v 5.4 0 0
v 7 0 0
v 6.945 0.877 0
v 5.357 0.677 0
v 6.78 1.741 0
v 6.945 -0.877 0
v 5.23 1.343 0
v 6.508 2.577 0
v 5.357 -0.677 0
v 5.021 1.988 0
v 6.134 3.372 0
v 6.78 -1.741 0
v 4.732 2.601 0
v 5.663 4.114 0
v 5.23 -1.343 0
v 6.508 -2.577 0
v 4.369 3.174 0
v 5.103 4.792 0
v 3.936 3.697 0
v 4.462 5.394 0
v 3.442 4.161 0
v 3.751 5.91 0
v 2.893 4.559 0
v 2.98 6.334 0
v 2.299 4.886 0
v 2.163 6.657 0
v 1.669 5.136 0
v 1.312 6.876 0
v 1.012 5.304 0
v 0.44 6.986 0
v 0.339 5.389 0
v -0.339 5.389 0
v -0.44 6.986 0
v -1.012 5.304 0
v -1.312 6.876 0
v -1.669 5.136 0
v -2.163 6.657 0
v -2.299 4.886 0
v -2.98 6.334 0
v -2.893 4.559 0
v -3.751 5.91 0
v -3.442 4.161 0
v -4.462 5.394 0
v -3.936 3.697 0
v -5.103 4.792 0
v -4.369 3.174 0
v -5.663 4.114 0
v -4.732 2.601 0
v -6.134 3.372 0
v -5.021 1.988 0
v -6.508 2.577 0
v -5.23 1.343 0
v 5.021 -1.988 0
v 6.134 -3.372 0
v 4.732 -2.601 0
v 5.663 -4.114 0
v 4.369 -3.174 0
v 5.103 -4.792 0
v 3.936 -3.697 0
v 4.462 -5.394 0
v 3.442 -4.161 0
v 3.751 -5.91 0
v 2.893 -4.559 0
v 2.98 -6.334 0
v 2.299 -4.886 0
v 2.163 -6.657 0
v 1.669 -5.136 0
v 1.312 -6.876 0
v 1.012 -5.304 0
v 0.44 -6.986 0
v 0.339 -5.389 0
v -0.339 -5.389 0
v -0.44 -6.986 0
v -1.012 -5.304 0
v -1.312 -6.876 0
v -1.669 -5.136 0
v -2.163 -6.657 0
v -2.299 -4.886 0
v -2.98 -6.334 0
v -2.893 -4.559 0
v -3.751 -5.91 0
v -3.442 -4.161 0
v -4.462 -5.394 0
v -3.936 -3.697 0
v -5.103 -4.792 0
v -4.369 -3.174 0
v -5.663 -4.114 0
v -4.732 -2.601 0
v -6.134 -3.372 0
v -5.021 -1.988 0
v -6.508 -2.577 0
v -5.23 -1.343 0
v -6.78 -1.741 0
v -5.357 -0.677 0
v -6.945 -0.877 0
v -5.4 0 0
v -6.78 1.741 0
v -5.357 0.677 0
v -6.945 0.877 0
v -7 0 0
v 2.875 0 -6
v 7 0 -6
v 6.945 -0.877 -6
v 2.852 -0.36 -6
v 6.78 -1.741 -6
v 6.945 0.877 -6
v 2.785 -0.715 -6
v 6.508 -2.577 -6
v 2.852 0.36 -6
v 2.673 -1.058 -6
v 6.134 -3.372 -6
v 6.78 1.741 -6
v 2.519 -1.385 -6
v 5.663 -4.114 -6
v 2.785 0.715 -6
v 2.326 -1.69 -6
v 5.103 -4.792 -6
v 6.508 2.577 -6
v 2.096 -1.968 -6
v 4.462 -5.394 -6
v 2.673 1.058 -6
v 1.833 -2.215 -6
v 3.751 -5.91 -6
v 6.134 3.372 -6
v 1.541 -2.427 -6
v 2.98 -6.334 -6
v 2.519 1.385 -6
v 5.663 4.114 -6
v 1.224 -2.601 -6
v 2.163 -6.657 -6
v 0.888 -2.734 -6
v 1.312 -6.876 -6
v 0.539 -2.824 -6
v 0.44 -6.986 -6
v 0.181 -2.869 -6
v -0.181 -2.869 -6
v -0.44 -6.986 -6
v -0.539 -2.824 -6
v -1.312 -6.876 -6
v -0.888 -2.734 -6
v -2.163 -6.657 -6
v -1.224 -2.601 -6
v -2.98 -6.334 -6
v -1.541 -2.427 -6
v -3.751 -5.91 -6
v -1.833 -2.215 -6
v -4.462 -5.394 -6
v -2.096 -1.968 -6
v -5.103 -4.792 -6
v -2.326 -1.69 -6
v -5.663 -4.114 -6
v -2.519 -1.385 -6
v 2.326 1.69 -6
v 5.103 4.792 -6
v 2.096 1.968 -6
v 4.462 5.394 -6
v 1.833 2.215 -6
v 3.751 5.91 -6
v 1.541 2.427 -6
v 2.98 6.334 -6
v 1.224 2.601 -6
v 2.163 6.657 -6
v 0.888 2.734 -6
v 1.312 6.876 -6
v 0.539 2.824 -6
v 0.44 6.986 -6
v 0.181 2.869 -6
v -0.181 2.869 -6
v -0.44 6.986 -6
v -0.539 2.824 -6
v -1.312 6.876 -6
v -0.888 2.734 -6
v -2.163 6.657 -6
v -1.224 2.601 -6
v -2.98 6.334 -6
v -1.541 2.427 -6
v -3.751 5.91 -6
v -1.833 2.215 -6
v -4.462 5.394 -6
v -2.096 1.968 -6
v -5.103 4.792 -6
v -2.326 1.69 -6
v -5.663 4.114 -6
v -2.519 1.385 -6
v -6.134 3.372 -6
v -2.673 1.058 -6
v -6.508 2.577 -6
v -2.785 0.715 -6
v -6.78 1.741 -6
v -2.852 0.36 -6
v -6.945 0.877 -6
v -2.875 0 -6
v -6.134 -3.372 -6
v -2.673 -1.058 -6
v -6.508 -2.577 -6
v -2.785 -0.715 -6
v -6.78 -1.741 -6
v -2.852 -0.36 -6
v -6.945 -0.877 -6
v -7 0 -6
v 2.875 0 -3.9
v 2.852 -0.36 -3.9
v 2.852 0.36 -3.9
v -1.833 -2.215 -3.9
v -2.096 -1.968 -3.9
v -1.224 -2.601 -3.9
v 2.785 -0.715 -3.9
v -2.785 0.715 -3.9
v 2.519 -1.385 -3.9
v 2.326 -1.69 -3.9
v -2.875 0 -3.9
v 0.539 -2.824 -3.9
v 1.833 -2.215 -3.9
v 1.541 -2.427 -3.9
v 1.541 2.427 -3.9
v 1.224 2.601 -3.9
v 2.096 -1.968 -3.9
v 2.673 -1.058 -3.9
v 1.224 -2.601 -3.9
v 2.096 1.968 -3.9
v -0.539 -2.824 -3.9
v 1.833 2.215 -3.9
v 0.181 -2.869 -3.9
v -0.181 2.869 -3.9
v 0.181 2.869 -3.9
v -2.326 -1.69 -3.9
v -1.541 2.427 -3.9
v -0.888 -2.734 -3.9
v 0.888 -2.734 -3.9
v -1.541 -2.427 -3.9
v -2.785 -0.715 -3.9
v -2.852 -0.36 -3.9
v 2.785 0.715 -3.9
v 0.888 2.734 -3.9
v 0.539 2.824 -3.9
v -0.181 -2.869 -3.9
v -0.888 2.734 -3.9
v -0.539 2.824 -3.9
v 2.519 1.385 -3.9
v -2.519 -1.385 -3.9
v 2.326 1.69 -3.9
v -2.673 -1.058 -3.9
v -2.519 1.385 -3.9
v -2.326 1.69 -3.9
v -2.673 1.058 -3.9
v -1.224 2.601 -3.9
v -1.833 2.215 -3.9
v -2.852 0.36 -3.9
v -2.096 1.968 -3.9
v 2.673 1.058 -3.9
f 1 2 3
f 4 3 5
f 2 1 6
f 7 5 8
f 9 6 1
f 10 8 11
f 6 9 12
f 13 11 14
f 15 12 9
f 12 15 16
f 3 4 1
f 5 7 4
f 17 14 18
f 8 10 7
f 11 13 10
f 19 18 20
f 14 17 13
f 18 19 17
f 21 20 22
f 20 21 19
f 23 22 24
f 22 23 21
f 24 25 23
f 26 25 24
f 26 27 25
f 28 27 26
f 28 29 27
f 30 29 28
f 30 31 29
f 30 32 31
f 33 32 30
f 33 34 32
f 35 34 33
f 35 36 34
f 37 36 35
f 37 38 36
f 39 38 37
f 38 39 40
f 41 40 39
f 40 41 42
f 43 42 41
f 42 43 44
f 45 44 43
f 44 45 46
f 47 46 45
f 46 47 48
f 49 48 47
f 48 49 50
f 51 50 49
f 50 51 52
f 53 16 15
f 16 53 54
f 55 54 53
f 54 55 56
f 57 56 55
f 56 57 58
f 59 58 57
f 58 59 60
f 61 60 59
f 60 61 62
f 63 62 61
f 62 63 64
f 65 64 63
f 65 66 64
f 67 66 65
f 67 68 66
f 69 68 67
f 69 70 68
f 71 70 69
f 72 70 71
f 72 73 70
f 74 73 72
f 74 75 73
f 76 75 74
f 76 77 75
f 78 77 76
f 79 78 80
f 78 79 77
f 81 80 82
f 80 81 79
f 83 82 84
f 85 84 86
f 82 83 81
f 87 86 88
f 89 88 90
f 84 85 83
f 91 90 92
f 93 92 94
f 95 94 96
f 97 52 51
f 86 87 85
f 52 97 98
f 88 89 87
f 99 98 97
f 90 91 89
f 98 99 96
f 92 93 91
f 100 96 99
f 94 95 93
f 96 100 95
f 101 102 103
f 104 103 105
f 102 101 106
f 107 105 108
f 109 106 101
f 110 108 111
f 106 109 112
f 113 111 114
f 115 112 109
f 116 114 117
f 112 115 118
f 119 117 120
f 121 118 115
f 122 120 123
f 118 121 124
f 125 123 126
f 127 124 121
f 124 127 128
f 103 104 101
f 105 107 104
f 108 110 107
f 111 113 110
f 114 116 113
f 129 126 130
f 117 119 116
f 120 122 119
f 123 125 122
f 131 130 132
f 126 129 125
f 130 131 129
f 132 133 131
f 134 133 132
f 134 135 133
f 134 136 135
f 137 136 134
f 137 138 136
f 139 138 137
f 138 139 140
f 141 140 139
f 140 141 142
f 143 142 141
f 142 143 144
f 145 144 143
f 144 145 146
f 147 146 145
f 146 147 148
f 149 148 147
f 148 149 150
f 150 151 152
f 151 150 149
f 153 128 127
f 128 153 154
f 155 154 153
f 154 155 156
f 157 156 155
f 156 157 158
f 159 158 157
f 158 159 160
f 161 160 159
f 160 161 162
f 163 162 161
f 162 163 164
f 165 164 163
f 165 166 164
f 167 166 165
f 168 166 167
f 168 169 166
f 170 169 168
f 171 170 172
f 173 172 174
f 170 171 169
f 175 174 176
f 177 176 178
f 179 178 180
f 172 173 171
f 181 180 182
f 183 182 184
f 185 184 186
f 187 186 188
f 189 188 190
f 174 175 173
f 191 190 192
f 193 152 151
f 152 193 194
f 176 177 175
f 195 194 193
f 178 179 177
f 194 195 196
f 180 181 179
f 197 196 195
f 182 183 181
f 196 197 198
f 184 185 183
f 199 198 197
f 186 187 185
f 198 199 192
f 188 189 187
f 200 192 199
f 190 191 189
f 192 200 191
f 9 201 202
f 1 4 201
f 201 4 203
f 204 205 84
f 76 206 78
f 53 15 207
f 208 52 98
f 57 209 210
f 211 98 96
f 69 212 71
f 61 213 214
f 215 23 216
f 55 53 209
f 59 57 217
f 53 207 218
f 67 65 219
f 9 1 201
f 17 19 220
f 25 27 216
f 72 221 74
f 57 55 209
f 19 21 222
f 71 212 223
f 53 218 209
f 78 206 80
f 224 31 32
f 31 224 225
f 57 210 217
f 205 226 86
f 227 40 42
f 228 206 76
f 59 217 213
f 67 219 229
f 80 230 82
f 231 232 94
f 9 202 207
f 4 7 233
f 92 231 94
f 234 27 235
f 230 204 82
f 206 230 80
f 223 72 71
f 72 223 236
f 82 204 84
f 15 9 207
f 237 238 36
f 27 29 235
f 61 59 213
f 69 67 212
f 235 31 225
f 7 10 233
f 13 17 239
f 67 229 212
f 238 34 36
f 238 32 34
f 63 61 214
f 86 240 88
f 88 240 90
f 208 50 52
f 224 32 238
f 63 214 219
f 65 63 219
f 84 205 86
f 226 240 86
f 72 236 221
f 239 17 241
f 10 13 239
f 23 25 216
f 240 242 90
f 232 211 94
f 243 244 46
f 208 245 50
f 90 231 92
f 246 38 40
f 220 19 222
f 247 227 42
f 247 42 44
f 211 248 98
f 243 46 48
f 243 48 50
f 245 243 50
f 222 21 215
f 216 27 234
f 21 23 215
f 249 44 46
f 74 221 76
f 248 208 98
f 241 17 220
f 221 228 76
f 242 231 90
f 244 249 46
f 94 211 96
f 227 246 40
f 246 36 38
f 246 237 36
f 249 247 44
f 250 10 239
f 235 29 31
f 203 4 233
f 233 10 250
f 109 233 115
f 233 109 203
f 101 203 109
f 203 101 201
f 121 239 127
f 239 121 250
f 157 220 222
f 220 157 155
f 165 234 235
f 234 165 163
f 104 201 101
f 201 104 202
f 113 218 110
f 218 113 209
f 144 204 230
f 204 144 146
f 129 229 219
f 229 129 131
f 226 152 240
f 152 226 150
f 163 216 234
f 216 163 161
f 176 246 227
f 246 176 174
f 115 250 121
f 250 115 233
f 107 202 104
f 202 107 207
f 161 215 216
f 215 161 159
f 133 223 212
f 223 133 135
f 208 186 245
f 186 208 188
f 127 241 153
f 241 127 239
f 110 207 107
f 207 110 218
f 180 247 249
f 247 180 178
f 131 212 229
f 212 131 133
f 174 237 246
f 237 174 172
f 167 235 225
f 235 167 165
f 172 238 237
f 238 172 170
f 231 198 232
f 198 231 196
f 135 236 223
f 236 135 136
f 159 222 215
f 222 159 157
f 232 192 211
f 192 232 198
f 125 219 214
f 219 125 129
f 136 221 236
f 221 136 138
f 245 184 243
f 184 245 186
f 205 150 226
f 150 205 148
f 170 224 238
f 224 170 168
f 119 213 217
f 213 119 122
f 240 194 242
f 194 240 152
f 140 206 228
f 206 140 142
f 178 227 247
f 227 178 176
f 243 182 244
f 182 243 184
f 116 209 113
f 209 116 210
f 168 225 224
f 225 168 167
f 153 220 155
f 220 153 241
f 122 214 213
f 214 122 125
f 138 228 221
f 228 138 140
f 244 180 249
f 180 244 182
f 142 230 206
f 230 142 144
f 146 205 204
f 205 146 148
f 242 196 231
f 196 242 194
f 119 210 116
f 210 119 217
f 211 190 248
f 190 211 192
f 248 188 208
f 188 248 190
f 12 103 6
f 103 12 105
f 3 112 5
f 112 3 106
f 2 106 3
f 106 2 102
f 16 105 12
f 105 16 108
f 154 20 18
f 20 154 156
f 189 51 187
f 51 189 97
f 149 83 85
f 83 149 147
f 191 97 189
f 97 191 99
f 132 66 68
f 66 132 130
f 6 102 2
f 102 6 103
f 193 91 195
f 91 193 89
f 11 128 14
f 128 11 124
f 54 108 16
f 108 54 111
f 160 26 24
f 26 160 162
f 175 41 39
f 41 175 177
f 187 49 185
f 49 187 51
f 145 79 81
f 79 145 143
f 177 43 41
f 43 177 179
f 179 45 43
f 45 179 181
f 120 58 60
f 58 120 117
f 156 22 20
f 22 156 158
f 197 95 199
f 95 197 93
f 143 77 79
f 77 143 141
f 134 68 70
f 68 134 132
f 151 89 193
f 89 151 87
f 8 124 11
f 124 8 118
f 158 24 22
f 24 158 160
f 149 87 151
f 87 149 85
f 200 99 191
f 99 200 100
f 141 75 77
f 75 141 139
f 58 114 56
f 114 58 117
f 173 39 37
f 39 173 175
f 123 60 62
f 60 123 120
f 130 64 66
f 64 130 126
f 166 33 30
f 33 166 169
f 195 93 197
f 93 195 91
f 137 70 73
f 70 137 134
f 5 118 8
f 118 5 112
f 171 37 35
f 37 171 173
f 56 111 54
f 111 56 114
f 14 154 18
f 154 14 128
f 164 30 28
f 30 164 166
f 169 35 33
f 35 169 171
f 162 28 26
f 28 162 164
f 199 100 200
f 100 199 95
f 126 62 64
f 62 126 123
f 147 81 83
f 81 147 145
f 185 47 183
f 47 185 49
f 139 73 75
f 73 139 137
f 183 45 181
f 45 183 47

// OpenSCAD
$fn = 50;


difference() {
	union() {
		translate(v = [0, 0, -6.0000000000]) {
			cylinder(h = 6, r = 7.0000000000);
		}
		cylinder(h = 0, r = 13.0000000000);
	}
	union() {
		translate(v = [0, 0, 0]) {
			rotate(a = [0, 0, 0]) {
				difference() {
					union() {
						#translate(v = [0, 0, -6.0000000000]) {
							cylinder(h = 6, r = 2.6000000000);
						}
						#translate(v = [0, 0, -3.9000000000]) {
							cylinder(h = 3.9000000000, r1 = 2.8750000000, r2 = 5.4000000000);
						}
						#translate(v = [0, 0, -6.0000000000]) {
							cylinder(h = 6, r = 2.8750000000);
						}
						#translate(v = [0, 0, -6.0000000000]) {
							cylinder(h = 6, r = 2.6000000000);
						}
					}
					union();
				}
			}
		}
	}
}
